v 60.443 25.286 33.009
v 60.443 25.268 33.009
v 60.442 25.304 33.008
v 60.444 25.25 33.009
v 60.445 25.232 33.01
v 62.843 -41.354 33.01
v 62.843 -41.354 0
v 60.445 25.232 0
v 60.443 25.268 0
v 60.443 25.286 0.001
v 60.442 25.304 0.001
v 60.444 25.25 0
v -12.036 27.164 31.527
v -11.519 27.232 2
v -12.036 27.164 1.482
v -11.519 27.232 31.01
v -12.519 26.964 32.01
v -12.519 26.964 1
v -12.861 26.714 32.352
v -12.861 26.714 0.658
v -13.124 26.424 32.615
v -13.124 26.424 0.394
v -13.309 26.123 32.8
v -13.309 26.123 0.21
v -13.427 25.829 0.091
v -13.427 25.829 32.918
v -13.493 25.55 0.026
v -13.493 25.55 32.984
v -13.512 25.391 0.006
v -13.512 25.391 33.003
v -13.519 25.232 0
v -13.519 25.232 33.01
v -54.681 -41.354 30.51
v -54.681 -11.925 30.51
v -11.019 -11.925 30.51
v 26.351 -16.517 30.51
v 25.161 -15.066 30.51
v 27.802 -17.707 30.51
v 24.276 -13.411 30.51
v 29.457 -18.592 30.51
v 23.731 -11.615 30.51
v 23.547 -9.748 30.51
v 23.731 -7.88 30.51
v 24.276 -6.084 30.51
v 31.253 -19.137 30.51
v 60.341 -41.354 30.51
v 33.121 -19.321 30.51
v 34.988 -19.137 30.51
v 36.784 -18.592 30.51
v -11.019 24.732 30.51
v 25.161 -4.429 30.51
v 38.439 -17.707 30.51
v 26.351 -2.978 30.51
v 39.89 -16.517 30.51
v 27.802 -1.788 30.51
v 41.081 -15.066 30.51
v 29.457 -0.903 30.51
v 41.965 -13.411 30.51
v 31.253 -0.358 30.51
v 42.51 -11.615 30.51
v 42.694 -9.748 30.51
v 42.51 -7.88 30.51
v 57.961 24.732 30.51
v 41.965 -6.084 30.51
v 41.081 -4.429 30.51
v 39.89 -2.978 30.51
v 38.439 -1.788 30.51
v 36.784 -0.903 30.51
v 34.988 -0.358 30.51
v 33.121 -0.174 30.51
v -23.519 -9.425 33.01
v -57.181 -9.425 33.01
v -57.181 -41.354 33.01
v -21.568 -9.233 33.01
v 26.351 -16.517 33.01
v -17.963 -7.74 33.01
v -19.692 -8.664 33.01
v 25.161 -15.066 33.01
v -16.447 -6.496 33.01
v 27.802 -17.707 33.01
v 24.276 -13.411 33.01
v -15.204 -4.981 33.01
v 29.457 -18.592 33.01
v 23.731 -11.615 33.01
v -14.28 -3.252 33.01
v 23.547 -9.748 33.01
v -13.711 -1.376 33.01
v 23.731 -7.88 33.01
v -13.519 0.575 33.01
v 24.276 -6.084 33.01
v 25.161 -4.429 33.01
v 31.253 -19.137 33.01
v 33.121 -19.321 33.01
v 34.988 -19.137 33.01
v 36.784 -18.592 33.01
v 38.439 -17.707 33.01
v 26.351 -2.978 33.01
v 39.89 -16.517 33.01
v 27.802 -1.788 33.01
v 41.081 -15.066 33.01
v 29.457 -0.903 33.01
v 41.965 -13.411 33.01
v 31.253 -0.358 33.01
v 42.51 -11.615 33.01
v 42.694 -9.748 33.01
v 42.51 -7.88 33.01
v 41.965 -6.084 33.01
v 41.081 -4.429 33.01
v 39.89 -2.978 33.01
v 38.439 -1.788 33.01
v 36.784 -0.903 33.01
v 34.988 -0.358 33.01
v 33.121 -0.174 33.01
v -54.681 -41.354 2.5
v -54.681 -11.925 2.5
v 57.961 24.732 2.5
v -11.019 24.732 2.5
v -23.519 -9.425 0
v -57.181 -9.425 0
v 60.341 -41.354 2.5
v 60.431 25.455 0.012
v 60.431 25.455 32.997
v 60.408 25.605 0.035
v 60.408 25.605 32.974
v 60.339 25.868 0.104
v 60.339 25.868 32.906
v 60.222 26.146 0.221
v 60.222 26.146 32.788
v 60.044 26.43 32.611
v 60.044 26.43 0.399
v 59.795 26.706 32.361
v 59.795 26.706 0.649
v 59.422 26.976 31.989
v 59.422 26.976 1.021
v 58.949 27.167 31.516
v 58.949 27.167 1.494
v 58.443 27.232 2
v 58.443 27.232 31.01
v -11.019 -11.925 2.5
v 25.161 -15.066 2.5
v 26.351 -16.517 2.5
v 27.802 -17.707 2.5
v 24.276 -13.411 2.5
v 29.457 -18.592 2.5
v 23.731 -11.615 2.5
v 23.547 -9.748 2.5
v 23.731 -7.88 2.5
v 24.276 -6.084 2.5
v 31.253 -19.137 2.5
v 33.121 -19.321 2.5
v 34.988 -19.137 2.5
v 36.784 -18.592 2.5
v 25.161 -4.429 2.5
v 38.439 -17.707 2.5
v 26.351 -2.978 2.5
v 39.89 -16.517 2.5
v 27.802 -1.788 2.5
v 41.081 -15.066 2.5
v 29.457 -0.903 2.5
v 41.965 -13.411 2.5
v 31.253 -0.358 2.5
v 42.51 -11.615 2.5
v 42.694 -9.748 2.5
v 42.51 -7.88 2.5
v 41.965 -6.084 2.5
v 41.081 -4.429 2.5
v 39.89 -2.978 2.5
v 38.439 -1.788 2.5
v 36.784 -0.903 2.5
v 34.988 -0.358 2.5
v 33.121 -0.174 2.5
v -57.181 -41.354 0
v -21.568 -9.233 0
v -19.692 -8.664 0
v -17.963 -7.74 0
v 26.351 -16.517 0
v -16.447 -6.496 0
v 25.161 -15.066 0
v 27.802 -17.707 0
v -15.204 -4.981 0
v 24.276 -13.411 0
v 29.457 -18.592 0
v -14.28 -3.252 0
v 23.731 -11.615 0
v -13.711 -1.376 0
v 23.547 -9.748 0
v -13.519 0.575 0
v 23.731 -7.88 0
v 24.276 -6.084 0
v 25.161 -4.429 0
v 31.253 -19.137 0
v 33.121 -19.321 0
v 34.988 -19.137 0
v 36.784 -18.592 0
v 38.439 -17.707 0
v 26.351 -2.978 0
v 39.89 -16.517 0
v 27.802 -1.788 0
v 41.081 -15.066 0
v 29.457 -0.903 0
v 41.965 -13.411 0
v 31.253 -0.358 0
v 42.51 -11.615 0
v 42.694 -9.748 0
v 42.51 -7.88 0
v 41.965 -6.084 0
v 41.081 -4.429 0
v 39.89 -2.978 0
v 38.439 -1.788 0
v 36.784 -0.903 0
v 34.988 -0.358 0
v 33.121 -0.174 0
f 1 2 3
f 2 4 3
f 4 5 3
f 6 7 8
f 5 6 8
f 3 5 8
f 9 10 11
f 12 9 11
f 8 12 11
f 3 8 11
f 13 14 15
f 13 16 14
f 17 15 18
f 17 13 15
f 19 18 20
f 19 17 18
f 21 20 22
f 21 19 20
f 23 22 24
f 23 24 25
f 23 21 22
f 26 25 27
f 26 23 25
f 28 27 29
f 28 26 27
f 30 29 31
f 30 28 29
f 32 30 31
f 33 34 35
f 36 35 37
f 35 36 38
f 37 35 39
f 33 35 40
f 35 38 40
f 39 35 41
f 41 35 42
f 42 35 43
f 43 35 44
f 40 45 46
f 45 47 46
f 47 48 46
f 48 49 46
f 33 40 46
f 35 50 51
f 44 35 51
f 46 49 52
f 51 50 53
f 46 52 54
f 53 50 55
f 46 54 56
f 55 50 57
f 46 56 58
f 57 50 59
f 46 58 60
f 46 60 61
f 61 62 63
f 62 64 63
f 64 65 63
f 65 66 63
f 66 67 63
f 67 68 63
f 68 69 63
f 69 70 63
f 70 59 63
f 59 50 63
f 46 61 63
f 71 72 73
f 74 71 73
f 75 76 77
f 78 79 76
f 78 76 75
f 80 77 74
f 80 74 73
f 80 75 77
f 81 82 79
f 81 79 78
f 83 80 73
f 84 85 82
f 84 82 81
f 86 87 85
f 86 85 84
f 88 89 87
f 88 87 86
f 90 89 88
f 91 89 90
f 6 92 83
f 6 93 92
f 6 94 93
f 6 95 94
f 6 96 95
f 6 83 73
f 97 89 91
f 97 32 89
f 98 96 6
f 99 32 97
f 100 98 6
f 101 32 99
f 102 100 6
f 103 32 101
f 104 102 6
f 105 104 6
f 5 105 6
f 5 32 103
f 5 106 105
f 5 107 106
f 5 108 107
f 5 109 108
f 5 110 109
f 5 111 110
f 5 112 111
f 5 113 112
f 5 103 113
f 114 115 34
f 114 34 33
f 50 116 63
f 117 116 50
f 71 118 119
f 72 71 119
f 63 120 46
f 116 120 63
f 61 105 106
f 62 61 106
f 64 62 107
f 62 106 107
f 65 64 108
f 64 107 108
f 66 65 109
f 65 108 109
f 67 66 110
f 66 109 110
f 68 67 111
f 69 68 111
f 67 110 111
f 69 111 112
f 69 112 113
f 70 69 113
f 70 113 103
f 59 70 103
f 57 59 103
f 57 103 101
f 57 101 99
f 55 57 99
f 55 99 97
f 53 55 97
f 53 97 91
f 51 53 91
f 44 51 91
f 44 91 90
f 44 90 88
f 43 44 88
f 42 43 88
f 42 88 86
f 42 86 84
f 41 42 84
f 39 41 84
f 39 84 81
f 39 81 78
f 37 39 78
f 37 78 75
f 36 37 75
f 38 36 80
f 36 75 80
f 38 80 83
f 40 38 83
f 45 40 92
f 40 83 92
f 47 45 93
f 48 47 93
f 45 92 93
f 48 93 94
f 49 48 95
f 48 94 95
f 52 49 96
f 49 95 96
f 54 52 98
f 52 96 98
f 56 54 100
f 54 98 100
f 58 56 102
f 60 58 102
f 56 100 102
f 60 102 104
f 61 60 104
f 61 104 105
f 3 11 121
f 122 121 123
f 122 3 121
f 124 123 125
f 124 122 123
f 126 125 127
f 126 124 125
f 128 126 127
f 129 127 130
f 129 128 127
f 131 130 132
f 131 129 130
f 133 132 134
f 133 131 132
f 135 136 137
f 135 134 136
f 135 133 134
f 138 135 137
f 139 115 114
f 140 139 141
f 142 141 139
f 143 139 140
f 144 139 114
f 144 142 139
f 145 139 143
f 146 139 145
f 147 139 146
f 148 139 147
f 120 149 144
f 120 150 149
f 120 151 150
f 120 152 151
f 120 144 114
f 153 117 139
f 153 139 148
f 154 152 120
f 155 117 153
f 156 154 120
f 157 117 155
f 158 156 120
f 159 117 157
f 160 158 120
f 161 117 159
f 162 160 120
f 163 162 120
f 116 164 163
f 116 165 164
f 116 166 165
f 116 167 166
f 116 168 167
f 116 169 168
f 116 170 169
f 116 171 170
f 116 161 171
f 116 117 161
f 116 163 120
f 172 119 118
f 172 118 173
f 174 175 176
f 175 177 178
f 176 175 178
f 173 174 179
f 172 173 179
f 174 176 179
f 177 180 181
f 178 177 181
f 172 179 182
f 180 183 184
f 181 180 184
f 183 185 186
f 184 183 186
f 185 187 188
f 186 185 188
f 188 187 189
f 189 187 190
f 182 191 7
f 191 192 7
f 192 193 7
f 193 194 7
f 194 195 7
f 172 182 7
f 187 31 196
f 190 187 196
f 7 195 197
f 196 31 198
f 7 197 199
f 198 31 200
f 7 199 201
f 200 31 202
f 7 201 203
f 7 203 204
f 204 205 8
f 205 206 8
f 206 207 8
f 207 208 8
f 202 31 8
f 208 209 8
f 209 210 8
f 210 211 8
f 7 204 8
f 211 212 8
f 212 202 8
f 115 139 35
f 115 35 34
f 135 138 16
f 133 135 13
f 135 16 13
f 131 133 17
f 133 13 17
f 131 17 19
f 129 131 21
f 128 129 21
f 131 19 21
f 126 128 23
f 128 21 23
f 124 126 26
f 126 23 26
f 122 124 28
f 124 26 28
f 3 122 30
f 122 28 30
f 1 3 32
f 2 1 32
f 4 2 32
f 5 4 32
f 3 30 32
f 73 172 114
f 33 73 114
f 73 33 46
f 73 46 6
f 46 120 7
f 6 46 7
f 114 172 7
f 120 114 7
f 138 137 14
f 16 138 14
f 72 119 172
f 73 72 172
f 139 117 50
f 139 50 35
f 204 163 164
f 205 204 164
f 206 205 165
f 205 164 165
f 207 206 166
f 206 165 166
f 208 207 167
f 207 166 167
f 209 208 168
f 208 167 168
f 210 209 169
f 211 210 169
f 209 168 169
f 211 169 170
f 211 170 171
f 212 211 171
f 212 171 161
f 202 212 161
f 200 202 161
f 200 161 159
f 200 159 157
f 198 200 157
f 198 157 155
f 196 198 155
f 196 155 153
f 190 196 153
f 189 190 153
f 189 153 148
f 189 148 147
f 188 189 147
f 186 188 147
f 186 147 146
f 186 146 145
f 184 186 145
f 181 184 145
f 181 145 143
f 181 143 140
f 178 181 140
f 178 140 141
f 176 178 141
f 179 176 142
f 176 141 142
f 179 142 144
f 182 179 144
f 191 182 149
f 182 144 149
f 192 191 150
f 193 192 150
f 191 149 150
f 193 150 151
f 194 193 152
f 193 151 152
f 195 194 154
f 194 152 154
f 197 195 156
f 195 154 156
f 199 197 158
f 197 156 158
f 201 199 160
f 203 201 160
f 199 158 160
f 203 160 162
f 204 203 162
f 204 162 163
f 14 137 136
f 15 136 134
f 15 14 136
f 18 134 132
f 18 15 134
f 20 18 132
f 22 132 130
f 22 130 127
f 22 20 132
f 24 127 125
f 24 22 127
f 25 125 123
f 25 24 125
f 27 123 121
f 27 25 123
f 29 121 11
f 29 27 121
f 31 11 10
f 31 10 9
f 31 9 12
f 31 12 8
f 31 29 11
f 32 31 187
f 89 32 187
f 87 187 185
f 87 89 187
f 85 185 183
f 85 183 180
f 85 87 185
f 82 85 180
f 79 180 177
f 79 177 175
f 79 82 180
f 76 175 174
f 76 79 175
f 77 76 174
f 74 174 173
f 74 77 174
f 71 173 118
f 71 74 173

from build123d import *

# Parameters (mm, degrees)
F1_DEPTH = 33.0095589161
F3_R     = 2
F4_T     = -2.5
F5_R     = 10
F2_R     = 9.5732270721
F6_DEPTH = 66.1102235317


with BuildPart() as f1:
    # F0 (on Top) → F1 (new body)
    with BuildSketch(Plane.XY):
        Polygon((62.8429502249, -41.3544625044), (60.3725537658, 27.2316709161), (-13.5185569525, 27.2316709161), (-13.5185569525, -9.4249695539), (-57.1811795235, -9.4249695539), (-57.1811795235, -41.3544625044), align=None)
    extrude(amount=F1_DEPTH)

    # F3
    f3_edges = [f1.edges().sort_by_distance(p)[0] for p in [
        (60.372554, 27.231671, 16.504779),
        (-13.518557, 27.231671, 16.504779),
        (23.426998, 27.231671, 0),
        (23.426998, 27.231671, 33.009559),
    ]]
    fillet(f3_edges, radius=F3_R)

    # F4
    f4_openings = [f1.faces().sort_by_distance(p)[0] for p in [
        (2.830885, -41.354463, 16.504779),
    ]]
    offset(amount=F4_T, openings=f4_openings, kind=Kind.INTERSECTION)

    # F5
    f5_edges = [f1.edges().sort_by_distance(p)[0] for p in [
        (-13.518557, -9.42497, 16.504779),
    ]]
    fillet(f5_edges, radius=F5_R)

    # F2 (on face) → F6 (cut)
    with BuildSketch(Plane.XY.offset(33.0095589161)):
        with Locations((33.1206843257, -9.747531265)):
            Circle(F2_R)
    extrude(amount=-F6_DEPTH, mode=Mode.SUBTRACT)


solid = f1.part
